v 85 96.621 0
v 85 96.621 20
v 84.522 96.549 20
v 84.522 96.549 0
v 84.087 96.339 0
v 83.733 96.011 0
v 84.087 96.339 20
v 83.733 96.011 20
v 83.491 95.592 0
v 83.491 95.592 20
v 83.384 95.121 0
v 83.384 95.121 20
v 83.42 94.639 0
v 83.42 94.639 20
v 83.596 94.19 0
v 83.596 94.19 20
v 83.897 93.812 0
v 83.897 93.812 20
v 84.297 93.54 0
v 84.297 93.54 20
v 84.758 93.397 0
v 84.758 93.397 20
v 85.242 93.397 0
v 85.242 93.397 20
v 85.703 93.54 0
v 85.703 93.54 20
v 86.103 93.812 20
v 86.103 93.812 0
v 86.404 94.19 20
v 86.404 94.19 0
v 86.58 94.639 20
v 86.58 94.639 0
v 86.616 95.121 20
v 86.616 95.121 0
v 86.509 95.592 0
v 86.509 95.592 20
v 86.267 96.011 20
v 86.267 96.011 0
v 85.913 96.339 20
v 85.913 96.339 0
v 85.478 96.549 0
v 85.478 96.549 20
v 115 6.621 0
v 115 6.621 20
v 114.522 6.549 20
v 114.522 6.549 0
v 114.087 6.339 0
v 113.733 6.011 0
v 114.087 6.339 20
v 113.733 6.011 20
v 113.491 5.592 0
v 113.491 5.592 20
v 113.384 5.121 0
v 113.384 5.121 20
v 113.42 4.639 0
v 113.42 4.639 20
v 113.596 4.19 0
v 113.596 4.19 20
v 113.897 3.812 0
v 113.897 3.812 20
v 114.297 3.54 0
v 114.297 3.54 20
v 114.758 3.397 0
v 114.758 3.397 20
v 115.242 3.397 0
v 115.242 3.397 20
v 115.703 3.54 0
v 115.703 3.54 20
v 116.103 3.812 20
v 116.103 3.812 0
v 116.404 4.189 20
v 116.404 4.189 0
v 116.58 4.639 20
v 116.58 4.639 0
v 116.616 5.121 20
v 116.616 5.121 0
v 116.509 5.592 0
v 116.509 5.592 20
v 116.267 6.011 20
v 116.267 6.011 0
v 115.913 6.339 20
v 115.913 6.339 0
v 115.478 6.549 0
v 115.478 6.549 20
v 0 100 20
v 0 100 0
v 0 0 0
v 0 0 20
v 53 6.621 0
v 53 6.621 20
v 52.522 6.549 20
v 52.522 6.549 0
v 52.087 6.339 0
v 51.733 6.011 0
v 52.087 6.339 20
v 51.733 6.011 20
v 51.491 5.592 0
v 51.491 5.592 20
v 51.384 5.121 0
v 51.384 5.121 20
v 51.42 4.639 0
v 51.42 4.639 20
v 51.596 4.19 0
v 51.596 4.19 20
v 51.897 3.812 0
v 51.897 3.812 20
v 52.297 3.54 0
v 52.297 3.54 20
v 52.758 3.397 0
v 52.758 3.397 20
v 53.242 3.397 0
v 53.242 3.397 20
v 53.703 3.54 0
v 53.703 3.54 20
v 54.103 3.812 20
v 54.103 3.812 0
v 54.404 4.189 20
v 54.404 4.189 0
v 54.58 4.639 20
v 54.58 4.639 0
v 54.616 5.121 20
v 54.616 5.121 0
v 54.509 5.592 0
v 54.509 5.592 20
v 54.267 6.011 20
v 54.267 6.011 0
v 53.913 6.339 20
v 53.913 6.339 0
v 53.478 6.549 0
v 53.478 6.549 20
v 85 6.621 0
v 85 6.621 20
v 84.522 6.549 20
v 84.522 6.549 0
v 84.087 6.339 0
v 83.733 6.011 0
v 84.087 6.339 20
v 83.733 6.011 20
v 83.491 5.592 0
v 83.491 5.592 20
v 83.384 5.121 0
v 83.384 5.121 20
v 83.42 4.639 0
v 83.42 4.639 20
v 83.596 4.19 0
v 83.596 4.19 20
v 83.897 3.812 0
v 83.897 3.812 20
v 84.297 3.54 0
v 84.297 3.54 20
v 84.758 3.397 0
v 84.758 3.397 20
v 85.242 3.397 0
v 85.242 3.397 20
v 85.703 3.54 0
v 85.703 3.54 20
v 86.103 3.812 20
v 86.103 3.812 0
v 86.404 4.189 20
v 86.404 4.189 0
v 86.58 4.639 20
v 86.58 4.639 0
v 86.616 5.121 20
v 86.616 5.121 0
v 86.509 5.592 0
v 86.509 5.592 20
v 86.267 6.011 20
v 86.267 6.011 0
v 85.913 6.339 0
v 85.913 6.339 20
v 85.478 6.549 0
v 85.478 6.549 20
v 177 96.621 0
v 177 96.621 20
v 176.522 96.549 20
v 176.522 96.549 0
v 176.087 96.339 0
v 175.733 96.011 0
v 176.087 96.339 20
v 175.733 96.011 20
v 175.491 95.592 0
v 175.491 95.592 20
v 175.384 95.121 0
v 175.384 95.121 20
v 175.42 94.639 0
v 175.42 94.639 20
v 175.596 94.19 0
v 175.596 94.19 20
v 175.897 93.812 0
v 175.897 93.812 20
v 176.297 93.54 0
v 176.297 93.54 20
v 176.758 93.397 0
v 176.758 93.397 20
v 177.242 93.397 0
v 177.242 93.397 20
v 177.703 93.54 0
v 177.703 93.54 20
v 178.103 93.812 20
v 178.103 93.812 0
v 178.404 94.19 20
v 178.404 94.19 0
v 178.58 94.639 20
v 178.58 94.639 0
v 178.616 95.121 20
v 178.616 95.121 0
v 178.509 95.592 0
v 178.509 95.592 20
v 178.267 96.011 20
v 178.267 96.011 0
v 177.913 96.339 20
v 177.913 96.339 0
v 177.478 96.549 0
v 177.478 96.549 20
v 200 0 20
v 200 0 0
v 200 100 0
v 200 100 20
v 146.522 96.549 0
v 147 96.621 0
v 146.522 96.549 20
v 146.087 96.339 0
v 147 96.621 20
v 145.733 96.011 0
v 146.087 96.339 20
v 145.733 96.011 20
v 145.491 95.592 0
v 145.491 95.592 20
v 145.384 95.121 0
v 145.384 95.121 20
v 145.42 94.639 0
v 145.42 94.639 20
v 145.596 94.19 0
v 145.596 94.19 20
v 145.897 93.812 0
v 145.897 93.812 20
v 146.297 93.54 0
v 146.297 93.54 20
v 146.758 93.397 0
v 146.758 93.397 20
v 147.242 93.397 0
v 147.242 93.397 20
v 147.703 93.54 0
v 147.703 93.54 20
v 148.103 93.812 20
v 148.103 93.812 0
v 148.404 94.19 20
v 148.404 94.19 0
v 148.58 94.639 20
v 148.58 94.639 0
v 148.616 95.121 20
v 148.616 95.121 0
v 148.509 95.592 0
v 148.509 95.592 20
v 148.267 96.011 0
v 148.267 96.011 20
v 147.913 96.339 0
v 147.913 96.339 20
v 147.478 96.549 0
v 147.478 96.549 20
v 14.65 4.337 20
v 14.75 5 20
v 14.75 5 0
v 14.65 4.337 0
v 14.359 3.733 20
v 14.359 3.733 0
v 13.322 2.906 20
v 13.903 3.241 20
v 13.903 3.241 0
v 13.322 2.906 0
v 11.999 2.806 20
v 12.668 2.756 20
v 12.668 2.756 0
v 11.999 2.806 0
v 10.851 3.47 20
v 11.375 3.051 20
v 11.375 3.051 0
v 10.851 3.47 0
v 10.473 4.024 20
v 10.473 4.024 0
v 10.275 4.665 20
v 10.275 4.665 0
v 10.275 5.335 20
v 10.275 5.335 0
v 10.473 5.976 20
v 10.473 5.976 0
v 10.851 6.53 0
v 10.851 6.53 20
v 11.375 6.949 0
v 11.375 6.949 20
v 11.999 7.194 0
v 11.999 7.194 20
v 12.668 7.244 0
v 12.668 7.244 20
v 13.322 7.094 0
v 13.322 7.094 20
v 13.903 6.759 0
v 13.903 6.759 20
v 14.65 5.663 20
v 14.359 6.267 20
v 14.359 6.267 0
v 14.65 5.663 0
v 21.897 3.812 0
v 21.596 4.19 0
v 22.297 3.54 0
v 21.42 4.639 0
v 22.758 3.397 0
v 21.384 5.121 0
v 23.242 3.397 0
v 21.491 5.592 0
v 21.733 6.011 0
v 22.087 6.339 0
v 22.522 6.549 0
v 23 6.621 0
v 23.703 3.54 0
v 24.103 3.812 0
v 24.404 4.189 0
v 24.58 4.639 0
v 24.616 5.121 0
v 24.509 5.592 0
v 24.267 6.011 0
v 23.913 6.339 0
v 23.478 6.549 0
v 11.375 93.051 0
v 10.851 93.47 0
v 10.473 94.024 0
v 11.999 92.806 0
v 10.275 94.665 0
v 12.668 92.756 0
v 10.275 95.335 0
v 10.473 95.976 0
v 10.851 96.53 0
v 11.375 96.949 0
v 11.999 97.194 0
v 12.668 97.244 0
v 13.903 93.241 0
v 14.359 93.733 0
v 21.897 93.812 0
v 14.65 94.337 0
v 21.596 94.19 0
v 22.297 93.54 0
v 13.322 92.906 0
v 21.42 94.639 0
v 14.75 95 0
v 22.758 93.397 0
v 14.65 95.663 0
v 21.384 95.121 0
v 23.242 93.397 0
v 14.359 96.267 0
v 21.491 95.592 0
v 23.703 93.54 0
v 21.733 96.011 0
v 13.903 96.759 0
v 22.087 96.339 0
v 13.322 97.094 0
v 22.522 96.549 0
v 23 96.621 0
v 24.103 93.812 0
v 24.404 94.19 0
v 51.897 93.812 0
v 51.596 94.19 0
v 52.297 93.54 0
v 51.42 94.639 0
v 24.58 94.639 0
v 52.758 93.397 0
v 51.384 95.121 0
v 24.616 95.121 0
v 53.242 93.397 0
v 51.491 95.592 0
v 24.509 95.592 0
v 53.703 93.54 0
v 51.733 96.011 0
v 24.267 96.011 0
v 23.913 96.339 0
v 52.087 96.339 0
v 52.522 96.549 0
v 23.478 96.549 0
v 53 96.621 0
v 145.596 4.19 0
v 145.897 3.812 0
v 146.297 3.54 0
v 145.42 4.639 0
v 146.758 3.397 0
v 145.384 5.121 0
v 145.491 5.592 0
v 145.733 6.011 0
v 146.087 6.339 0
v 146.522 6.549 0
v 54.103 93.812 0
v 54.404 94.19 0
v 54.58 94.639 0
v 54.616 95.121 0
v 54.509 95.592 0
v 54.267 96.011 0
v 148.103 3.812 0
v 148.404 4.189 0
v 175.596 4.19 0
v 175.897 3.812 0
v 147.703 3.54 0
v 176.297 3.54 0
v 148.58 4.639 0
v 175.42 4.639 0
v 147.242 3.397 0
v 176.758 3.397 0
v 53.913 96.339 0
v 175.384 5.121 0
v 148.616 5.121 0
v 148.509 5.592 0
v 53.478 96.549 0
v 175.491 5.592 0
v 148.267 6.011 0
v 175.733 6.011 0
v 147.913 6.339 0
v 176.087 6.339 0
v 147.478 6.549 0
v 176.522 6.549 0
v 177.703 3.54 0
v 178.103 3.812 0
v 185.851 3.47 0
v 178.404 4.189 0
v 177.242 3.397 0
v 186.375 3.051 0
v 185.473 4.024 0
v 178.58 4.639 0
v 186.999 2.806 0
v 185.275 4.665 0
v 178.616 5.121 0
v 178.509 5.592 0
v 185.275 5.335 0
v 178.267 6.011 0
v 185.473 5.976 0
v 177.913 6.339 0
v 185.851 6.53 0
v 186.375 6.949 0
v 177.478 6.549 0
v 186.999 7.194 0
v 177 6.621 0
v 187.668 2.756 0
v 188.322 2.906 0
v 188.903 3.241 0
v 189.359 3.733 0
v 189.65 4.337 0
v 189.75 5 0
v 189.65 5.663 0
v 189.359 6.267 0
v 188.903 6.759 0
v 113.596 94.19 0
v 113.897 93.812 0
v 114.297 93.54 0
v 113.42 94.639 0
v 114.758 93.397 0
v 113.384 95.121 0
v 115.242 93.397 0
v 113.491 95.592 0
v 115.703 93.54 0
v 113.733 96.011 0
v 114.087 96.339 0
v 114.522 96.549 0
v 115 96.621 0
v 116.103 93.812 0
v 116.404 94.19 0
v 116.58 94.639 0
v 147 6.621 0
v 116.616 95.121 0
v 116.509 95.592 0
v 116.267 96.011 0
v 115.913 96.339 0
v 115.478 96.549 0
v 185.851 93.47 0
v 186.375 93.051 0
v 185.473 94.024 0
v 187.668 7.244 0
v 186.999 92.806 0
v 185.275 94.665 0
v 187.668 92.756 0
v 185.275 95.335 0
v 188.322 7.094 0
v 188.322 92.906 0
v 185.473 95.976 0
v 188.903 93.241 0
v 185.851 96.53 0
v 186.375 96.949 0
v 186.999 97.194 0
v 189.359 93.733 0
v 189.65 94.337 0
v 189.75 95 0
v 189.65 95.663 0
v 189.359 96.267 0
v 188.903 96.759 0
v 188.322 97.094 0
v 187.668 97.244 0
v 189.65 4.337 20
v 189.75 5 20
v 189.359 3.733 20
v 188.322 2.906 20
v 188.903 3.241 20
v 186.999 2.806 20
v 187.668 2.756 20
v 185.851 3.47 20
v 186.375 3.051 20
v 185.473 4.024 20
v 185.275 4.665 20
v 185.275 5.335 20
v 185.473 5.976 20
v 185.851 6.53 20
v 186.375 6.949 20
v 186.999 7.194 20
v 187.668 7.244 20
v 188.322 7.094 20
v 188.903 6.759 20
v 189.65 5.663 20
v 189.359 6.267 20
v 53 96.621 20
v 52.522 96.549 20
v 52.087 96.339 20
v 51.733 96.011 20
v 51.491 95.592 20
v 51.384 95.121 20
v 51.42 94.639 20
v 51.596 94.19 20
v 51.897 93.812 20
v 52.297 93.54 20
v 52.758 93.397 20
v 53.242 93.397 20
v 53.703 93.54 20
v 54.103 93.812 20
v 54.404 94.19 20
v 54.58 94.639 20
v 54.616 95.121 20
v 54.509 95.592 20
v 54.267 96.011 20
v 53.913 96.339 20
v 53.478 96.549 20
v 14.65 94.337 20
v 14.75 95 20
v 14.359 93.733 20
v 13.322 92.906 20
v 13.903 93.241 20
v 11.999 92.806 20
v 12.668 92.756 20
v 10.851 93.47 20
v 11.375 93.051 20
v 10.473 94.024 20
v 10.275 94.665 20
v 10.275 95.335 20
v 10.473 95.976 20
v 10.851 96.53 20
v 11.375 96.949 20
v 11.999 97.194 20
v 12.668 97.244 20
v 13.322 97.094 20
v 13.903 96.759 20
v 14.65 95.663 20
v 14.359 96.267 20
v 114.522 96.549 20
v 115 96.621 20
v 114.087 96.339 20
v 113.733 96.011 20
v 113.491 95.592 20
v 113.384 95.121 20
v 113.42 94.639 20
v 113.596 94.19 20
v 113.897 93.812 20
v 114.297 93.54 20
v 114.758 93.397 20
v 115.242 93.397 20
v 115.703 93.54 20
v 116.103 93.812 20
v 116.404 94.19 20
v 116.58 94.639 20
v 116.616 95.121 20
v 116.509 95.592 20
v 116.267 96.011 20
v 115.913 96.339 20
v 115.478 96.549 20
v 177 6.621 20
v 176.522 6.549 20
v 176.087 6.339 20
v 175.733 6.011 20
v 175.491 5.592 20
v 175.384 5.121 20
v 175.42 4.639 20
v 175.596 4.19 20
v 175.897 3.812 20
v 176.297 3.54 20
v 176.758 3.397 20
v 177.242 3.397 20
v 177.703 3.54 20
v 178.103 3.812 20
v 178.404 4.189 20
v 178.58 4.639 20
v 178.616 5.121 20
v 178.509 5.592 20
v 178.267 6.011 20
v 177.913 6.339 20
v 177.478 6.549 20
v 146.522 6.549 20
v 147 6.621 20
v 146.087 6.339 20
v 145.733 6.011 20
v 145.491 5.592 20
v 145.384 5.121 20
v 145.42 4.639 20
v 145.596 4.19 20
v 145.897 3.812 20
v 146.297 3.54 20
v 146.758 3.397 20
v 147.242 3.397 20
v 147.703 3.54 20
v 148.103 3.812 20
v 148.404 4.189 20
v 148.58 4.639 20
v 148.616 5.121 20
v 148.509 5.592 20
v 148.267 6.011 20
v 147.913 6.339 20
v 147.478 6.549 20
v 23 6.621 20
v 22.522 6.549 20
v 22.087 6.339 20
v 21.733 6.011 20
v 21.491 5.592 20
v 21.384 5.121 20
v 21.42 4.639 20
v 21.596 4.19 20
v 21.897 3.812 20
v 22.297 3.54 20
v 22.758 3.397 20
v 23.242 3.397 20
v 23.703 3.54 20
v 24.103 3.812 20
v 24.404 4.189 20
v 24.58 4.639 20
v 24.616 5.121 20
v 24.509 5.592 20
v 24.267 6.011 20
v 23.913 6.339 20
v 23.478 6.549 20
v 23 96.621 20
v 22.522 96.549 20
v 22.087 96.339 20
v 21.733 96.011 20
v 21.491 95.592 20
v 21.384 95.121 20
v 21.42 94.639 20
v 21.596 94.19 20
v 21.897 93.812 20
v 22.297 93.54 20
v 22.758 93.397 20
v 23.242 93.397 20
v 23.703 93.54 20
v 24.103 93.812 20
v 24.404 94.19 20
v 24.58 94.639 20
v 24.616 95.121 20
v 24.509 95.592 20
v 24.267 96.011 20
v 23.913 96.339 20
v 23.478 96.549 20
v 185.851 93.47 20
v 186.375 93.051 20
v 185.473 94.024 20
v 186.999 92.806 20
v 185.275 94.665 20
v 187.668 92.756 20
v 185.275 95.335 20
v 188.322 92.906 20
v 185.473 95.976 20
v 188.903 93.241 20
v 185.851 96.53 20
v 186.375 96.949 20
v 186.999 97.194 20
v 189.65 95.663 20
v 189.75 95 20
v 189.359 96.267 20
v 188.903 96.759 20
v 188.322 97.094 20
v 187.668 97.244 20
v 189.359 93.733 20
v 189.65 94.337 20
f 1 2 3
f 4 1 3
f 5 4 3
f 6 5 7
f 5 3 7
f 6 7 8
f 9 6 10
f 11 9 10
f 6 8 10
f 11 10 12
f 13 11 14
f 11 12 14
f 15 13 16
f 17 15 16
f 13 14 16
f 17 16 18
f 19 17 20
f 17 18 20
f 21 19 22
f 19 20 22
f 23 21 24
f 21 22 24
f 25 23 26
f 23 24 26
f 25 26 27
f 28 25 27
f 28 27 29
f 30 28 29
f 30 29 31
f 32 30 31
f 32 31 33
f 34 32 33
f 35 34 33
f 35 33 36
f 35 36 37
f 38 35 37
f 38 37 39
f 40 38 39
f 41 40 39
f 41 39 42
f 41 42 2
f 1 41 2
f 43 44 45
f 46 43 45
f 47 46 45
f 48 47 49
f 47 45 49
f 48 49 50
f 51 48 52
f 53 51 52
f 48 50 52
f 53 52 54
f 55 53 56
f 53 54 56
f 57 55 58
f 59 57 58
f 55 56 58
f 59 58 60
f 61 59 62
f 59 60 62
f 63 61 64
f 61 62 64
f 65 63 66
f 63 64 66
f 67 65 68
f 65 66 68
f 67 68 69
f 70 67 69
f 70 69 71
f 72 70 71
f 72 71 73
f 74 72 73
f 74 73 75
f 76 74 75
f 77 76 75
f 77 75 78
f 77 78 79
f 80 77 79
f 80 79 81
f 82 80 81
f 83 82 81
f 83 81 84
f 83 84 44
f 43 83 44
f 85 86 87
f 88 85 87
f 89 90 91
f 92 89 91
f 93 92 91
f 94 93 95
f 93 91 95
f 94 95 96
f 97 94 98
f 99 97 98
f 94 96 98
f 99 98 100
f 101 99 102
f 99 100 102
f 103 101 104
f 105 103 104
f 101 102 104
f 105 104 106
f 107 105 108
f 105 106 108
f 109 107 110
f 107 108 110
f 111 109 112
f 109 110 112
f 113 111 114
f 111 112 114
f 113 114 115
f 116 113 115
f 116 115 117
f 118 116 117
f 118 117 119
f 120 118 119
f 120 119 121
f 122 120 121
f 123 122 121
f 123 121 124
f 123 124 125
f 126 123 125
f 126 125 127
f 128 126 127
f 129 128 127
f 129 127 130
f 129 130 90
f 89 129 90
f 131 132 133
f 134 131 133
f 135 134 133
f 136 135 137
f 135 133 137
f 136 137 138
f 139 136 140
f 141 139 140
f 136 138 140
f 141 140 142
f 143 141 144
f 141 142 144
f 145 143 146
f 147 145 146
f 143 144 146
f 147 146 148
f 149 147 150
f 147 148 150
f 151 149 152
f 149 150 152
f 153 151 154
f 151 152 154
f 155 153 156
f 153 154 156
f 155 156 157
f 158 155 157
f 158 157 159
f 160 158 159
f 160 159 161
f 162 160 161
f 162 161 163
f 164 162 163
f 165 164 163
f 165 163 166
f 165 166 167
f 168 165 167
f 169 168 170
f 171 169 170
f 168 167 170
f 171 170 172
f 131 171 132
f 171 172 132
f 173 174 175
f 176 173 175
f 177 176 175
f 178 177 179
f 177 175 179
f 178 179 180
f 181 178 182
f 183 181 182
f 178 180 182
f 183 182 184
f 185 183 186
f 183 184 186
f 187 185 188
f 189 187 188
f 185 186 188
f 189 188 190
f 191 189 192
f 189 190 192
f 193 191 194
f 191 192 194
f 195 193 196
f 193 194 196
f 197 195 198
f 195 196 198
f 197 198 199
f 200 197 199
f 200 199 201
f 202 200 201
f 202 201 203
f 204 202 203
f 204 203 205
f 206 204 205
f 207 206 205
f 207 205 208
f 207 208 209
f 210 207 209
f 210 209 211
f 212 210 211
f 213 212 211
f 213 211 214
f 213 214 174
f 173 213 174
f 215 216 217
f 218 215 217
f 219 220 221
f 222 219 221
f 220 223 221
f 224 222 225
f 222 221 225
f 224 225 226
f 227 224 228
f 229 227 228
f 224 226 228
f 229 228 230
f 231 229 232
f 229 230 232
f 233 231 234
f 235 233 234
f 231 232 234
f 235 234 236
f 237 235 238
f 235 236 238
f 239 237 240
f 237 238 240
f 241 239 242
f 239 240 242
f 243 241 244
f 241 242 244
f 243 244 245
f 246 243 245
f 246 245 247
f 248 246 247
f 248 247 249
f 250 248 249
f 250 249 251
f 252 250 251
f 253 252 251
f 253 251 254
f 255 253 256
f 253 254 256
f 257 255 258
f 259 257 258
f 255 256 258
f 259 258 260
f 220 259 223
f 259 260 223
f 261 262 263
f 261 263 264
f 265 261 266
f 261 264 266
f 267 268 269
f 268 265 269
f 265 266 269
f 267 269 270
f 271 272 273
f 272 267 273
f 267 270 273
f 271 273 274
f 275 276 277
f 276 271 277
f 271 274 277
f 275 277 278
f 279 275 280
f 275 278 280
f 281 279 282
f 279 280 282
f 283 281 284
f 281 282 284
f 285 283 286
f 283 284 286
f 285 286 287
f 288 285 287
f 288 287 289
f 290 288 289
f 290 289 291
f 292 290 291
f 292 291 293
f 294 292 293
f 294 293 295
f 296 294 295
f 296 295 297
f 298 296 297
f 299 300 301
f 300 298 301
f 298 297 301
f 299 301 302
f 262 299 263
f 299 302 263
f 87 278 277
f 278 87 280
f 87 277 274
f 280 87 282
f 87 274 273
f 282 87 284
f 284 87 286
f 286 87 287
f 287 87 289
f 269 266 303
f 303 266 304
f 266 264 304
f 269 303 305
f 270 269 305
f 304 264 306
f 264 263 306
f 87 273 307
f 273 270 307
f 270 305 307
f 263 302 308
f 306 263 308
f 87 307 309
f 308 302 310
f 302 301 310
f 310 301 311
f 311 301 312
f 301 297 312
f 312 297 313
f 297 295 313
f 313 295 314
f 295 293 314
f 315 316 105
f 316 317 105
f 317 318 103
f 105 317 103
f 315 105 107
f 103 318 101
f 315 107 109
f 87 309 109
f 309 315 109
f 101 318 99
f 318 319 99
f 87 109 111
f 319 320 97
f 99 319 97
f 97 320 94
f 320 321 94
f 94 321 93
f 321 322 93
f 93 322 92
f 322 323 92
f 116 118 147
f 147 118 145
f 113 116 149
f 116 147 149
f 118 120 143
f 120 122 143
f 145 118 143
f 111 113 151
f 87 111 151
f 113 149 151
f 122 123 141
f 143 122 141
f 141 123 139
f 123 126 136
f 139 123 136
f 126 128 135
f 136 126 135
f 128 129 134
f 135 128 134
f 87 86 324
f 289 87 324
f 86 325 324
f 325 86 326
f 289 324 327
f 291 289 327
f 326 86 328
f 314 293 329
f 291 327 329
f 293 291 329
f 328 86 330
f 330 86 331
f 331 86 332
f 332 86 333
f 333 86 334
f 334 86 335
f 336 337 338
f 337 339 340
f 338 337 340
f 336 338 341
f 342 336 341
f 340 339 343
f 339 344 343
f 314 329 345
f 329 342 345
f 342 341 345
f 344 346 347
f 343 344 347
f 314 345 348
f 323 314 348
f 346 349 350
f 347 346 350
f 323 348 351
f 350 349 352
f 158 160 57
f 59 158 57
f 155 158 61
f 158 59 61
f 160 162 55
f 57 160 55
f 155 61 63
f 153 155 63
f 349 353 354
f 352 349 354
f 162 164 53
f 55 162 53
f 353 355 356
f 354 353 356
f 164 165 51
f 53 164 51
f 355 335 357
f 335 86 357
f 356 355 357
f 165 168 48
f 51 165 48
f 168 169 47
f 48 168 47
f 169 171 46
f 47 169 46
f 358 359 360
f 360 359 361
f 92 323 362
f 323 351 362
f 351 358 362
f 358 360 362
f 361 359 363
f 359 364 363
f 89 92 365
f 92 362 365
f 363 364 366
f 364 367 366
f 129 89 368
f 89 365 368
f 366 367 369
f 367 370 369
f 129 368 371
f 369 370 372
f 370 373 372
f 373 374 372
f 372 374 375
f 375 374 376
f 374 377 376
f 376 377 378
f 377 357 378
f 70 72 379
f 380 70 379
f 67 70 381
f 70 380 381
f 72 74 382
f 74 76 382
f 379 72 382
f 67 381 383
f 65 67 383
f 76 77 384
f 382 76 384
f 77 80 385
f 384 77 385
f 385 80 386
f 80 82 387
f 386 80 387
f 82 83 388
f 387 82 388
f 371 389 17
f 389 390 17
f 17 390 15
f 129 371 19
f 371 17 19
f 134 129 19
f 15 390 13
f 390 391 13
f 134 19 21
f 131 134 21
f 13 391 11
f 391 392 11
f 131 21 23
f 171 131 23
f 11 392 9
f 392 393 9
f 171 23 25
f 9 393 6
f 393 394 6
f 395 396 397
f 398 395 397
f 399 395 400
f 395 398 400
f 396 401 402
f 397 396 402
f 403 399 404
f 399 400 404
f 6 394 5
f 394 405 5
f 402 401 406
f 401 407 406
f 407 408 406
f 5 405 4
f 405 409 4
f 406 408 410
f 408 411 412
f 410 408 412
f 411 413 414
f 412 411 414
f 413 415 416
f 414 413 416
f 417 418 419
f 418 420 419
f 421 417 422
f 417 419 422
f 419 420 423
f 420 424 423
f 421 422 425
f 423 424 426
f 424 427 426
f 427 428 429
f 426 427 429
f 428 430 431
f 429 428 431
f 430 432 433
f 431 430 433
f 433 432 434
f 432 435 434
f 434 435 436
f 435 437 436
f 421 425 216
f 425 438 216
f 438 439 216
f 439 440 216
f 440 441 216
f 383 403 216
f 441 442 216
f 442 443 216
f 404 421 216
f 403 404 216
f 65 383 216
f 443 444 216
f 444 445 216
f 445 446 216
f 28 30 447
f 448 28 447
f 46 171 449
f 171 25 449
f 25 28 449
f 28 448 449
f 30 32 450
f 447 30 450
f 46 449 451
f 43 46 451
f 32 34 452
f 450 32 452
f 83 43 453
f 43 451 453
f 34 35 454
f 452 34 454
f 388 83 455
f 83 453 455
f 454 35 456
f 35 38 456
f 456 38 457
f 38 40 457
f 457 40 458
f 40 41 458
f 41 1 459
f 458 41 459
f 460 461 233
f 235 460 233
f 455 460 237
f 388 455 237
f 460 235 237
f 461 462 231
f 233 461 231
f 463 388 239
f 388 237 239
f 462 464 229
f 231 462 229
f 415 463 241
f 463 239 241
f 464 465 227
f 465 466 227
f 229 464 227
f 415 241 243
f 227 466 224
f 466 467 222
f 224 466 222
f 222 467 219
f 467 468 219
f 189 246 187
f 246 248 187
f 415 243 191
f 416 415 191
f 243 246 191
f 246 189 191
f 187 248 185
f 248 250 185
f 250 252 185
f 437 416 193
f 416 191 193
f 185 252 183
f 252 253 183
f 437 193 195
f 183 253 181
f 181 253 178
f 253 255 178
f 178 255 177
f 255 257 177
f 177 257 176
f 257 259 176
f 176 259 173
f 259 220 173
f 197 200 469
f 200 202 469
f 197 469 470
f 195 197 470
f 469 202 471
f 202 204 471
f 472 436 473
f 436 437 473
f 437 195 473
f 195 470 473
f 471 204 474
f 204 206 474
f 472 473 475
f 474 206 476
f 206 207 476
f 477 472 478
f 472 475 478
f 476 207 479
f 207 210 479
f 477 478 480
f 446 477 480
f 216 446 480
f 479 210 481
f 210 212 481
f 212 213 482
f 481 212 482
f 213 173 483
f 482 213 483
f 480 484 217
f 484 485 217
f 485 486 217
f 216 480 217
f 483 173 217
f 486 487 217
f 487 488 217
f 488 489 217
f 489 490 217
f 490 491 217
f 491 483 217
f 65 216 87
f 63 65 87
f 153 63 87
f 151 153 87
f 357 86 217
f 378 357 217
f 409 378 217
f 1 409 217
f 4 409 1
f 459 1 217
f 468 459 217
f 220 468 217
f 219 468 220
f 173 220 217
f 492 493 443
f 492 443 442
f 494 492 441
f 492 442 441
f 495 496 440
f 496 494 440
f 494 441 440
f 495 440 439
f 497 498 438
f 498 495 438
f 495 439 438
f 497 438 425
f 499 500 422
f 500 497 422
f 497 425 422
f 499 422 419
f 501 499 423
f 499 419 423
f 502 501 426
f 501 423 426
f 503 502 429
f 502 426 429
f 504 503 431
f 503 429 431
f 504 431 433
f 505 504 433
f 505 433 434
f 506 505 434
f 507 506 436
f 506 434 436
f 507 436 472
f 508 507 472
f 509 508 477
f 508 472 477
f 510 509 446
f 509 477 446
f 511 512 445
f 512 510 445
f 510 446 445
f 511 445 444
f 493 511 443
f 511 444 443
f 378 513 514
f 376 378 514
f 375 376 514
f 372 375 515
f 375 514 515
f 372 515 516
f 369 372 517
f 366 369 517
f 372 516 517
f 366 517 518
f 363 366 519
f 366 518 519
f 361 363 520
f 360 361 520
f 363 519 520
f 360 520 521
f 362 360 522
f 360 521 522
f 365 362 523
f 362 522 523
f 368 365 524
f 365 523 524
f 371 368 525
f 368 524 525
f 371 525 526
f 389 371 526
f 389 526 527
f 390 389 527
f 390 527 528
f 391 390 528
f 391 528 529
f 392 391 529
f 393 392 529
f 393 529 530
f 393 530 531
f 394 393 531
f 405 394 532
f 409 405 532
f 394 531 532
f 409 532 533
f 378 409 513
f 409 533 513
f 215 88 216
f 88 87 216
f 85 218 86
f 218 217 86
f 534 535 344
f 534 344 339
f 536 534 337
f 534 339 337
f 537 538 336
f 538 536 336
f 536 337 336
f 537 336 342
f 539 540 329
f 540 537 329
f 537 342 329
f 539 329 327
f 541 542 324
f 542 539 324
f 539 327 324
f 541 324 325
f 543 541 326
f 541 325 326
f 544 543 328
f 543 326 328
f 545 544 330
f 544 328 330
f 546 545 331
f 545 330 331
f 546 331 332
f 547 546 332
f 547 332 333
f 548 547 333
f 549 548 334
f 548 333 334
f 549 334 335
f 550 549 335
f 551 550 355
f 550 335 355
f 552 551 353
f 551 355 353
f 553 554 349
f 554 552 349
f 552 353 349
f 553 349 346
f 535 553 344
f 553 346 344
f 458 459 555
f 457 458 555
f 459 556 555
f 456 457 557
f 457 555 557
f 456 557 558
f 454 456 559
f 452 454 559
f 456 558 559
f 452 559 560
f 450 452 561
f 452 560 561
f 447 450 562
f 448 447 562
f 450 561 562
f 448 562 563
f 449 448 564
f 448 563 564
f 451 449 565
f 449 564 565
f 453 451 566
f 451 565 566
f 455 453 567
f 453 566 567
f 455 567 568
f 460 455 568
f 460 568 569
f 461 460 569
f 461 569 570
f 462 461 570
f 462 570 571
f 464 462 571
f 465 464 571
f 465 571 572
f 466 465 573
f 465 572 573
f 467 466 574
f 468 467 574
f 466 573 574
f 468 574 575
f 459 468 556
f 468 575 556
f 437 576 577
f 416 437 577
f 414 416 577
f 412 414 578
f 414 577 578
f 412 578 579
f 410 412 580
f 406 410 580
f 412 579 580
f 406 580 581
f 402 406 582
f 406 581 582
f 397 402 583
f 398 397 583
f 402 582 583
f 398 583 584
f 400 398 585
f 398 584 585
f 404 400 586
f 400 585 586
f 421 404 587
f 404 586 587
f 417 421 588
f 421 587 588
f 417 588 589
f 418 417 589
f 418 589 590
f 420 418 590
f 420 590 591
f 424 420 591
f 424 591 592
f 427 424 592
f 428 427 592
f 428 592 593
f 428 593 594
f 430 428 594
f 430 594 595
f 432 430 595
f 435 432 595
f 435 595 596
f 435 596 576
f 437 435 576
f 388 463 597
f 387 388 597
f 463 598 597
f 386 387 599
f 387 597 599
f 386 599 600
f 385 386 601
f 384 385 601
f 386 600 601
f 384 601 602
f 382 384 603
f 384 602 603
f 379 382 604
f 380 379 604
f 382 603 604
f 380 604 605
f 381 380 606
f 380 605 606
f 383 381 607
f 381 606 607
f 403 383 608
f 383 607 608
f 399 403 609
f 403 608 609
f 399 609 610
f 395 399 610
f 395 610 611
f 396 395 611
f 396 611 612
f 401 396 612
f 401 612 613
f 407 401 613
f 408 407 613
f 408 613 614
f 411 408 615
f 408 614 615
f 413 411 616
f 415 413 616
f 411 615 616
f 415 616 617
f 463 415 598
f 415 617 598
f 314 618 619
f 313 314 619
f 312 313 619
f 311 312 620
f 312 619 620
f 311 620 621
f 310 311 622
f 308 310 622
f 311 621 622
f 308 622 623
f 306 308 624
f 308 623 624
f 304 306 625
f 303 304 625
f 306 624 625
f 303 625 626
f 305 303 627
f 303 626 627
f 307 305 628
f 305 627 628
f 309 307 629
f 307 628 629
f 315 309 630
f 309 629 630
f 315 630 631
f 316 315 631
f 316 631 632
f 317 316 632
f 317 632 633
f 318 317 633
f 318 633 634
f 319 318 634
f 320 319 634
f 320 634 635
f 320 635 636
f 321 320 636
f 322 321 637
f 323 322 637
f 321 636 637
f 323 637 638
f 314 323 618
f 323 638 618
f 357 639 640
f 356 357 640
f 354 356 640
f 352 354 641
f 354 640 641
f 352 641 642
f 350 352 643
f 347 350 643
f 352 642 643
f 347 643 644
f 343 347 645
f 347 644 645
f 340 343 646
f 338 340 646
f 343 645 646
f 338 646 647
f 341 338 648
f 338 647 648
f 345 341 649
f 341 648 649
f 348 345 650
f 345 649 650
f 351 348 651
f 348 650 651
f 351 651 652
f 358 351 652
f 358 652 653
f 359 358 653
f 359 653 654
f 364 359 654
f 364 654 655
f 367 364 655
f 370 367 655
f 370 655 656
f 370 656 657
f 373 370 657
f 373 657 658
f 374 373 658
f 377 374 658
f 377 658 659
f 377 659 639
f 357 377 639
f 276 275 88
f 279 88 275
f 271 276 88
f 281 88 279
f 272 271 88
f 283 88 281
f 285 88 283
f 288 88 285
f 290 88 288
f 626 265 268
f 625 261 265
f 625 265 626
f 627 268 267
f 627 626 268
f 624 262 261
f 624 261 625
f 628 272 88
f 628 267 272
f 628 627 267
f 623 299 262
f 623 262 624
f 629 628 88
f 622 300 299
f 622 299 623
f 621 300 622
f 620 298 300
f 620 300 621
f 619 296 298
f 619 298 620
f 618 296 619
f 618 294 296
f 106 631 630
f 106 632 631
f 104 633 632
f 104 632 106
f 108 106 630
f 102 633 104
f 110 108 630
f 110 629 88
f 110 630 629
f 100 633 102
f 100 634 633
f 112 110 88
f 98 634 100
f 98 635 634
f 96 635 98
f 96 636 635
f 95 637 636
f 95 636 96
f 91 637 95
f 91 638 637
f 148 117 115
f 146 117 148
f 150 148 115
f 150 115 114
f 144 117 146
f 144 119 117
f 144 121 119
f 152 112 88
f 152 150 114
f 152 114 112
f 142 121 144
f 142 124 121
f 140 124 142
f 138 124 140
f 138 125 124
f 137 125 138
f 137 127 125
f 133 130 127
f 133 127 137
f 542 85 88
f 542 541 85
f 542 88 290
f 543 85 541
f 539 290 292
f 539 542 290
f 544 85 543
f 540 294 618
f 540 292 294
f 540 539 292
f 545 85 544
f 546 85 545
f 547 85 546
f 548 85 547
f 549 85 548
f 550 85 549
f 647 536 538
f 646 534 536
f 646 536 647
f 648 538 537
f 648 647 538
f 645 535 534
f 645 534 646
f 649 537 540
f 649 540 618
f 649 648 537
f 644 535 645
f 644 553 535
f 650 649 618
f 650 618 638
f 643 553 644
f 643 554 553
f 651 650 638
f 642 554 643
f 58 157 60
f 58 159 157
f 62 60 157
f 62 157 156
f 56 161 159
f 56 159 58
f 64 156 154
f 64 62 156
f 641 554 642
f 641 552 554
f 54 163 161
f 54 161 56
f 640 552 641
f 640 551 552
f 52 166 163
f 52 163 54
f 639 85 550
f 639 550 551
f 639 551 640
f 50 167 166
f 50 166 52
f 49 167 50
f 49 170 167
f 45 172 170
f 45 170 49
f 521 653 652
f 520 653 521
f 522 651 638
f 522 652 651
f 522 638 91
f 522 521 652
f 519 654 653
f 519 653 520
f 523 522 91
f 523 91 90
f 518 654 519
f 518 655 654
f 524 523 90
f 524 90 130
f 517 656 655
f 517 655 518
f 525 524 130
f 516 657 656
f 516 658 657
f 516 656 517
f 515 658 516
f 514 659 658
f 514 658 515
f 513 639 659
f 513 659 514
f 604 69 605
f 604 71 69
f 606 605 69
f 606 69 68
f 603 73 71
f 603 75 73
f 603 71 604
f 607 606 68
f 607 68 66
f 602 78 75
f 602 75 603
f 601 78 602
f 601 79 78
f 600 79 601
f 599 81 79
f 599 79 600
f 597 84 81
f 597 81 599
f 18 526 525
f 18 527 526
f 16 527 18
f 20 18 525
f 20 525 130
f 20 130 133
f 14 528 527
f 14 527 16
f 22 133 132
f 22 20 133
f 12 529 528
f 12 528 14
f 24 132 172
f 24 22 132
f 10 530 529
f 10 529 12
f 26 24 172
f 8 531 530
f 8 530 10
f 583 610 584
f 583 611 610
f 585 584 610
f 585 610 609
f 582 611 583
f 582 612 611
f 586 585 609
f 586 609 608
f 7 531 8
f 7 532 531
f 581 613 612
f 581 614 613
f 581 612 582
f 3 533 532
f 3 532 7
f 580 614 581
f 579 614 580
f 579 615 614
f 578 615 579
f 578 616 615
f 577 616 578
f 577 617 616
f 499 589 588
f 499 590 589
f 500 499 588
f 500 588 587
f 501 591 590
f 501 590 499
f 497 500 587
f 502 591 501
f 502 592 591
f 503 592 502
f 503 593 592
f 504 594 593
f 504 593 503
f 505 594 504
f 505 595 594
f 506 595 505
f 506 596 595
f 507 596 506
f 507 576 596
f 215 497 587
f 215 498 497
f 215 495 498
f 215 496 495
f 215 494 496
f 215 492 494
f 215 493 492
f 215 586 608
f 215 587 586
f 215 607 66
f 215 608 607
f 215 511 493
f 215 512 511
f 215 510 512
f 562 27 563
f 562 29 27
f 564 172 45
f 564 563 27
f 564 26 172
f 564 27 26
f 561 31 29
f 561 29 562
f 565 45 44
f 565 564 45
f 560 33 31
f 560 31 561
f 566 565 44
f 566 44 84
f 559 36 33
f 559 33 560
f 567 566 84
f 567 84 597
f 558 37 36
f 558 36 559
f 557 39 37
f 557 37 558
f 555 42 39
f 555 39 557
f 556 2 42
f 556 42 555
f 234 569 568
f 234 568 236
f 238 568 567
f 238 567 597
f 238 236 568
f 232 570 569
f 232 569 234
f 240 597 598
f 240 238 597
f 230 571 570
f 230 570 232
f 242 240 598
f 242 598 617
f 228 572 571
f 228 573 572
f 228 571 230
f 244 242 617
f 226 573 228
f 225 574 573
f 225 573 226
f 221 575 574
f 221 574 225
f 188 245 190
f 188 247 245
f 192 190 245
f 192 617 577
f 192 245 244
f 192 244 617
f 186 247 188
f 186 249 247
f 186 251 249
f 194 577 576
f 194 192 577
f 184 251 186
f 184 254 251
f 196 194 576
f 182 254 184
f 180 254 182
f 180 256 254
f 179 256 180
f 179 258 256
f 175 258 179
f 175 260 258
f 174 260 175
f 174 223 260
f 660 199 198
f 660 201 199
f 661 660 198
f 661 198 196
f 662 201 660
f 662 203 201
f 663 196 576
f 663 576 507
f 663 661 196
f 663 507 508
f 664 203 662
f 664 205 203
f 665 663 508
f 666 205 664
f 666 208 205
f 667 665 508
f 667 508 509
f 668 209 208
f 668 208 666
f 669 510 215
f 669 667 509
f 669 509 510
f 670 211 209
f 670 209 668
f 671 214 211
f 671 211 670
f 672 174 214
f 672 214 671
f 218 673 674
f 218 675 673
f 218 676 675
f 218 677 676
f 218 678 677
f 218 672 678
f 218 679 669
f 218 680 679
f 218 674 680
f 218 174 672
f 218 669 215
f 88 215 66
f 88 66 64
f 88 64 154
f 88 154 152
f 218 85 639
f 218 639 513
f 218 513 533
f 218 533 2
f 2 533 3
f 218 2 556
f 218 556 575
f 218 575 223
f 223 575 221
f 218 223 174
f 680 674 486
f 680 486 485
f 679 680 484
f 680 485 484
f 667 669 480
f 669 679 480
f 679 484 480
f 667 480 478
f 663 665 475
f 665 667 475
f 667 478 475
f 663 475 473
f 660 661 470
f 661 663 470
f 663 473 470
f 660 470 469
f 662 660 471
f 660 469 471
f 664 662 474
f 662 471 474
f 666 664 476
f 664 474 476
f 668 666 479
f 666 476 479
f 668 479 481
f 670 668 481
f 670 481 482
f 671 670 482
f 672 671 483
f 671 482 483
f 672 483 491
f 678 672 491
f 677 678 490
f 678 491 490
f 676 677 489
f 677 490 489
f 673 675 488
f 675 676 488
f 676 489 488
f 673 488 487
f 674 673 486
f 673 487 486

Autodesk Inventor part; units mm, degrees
ref_plane "YZ Plane" through (0, 0, 0) normal (1, 0, 0) x (0, 1, 0)
ref_plane "XZ Plane" through (0, 0, 0) normal (0, 1, 0) x (-1, 0, 0)
ref_plane "XY Plane" through (0, 0, 0) normal (0, 0, 1) x (1, 0, 0)
sketch "Sketch2" plane through (0, 0, 0) normal (0, 0, 1) x (1, 0, 0)
  line L0 (0, 0) -> (200, 0)
  line L1 (200, 0) -> (200, 100)
  line L2 (200, 100) -> (0, 100)
  line L3 (0, 100) -> (0, 0)
  line L4 (0, 5) -> (200, 5) construction
  line L5 (0, 95) -> (200, 95) construction
  circle A0 centre (12.5, 95) radius 2.25
  circle A1 centre (12.5, 5) radius 2.25
  circle A2 centre (187.5, 95) radius 2.25
  circle A3 centre (187.5, 5) radius 2.25
  point P0 (23, 5)
  point P1 (23, 95)
  point P2 (53, 5)
  point P3 (53, 95)
  point P4 (85, 95)
  point P5 (85, 5)
  point P6 (115, 95)
  point P7 (115, 5)
  point P8 (147, 95)
  point P9 (147, 5)
  point P10 (177, 95)
  point P11 (177, 5)
  dimension "d18" = 90
  dimension "d0" = 200
  dimension "d1" = 100
  dimension "d2" = 30
  dimension "d3" = 32
  dimension "d4" = 30
  dimension "d5" = 32
  dimension "d6" = 30
  dimension "d13" = 10.5
  dimension "d15" = 10.5
  dimension "d16" = 12.5
  dimension "d17" = 175
  dimension "d21" = 4.5
  dimension "d22" = 4.5
  dimension "d23" = 4.5
  dimension "d24" = 4.5
extrude "Extrusion2" add sketch "Sketch2" along normal blind 20
hole "Hole1" at (23, 5, 0) at (23, 95, 0) at (53, 5, 0) at (53, 95, 0) at (85, 95, 0) at (85, 5, 0) at (115, 95, 0) at (115, 5, 0) at (147, 95, 0) at (147, 5, 0) at (177, 95, 0) at (177, 5, 0) direction (0, 0, 1) diameter 3.242 end through all thread size "M4x0.7" class "6H" standard "ANSI Metric M Profile"
properties part number "3lasers1fiberHeatSinkBlock"
